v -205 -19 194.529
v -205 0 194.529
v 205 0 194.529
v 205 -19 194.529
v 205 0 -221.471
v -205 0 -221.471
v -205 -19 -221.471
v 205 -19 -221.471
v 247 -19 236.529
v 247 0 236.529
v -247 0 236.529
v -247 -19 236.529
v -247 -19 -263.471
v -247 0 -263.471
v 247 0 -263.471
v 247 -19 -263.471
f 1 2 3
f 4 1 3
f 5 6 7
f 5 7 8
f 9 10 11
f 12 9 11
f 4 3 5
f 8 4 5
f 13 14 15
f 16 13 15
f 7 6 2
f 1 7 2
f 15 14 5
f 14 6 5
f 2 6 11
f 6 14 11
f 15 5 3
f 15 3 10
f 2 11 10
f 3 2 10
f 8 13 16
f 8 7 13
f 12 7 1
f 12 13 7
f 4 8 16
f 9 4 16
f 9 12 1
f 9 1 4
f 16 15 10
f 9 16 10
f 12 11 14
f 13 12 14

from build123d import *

# Parameters (mm, degrees)
F0_W     = 410
F0_H     = 42
F1_DEPTH = 19


with BuildPart() as f1:
    # F0 (on Front) → F1 (new body)
    with BuildSketch(Plane.XZ):
        with Locations((0, 215.529412)):
            Rectangle(F0_W, F0_H)
        Polygon((205, 236.529412), (205, 194.529412), (205, -221.470588), (205, -263.470588), (247, -263.470588), (247, 236.529412), align=None)
        Polygon((-205, -221.470588), (-205, 194.529412), (-205, 236.529412), (-247, 236.529412), (-247, -263.470588), (-205, -263.470588), align=None)
        with Locations((0, -242.470588)):
            Rectangle(F0_W, F0_H)
    extrude(amount=F1_DEPTH)


solid = f1.part
